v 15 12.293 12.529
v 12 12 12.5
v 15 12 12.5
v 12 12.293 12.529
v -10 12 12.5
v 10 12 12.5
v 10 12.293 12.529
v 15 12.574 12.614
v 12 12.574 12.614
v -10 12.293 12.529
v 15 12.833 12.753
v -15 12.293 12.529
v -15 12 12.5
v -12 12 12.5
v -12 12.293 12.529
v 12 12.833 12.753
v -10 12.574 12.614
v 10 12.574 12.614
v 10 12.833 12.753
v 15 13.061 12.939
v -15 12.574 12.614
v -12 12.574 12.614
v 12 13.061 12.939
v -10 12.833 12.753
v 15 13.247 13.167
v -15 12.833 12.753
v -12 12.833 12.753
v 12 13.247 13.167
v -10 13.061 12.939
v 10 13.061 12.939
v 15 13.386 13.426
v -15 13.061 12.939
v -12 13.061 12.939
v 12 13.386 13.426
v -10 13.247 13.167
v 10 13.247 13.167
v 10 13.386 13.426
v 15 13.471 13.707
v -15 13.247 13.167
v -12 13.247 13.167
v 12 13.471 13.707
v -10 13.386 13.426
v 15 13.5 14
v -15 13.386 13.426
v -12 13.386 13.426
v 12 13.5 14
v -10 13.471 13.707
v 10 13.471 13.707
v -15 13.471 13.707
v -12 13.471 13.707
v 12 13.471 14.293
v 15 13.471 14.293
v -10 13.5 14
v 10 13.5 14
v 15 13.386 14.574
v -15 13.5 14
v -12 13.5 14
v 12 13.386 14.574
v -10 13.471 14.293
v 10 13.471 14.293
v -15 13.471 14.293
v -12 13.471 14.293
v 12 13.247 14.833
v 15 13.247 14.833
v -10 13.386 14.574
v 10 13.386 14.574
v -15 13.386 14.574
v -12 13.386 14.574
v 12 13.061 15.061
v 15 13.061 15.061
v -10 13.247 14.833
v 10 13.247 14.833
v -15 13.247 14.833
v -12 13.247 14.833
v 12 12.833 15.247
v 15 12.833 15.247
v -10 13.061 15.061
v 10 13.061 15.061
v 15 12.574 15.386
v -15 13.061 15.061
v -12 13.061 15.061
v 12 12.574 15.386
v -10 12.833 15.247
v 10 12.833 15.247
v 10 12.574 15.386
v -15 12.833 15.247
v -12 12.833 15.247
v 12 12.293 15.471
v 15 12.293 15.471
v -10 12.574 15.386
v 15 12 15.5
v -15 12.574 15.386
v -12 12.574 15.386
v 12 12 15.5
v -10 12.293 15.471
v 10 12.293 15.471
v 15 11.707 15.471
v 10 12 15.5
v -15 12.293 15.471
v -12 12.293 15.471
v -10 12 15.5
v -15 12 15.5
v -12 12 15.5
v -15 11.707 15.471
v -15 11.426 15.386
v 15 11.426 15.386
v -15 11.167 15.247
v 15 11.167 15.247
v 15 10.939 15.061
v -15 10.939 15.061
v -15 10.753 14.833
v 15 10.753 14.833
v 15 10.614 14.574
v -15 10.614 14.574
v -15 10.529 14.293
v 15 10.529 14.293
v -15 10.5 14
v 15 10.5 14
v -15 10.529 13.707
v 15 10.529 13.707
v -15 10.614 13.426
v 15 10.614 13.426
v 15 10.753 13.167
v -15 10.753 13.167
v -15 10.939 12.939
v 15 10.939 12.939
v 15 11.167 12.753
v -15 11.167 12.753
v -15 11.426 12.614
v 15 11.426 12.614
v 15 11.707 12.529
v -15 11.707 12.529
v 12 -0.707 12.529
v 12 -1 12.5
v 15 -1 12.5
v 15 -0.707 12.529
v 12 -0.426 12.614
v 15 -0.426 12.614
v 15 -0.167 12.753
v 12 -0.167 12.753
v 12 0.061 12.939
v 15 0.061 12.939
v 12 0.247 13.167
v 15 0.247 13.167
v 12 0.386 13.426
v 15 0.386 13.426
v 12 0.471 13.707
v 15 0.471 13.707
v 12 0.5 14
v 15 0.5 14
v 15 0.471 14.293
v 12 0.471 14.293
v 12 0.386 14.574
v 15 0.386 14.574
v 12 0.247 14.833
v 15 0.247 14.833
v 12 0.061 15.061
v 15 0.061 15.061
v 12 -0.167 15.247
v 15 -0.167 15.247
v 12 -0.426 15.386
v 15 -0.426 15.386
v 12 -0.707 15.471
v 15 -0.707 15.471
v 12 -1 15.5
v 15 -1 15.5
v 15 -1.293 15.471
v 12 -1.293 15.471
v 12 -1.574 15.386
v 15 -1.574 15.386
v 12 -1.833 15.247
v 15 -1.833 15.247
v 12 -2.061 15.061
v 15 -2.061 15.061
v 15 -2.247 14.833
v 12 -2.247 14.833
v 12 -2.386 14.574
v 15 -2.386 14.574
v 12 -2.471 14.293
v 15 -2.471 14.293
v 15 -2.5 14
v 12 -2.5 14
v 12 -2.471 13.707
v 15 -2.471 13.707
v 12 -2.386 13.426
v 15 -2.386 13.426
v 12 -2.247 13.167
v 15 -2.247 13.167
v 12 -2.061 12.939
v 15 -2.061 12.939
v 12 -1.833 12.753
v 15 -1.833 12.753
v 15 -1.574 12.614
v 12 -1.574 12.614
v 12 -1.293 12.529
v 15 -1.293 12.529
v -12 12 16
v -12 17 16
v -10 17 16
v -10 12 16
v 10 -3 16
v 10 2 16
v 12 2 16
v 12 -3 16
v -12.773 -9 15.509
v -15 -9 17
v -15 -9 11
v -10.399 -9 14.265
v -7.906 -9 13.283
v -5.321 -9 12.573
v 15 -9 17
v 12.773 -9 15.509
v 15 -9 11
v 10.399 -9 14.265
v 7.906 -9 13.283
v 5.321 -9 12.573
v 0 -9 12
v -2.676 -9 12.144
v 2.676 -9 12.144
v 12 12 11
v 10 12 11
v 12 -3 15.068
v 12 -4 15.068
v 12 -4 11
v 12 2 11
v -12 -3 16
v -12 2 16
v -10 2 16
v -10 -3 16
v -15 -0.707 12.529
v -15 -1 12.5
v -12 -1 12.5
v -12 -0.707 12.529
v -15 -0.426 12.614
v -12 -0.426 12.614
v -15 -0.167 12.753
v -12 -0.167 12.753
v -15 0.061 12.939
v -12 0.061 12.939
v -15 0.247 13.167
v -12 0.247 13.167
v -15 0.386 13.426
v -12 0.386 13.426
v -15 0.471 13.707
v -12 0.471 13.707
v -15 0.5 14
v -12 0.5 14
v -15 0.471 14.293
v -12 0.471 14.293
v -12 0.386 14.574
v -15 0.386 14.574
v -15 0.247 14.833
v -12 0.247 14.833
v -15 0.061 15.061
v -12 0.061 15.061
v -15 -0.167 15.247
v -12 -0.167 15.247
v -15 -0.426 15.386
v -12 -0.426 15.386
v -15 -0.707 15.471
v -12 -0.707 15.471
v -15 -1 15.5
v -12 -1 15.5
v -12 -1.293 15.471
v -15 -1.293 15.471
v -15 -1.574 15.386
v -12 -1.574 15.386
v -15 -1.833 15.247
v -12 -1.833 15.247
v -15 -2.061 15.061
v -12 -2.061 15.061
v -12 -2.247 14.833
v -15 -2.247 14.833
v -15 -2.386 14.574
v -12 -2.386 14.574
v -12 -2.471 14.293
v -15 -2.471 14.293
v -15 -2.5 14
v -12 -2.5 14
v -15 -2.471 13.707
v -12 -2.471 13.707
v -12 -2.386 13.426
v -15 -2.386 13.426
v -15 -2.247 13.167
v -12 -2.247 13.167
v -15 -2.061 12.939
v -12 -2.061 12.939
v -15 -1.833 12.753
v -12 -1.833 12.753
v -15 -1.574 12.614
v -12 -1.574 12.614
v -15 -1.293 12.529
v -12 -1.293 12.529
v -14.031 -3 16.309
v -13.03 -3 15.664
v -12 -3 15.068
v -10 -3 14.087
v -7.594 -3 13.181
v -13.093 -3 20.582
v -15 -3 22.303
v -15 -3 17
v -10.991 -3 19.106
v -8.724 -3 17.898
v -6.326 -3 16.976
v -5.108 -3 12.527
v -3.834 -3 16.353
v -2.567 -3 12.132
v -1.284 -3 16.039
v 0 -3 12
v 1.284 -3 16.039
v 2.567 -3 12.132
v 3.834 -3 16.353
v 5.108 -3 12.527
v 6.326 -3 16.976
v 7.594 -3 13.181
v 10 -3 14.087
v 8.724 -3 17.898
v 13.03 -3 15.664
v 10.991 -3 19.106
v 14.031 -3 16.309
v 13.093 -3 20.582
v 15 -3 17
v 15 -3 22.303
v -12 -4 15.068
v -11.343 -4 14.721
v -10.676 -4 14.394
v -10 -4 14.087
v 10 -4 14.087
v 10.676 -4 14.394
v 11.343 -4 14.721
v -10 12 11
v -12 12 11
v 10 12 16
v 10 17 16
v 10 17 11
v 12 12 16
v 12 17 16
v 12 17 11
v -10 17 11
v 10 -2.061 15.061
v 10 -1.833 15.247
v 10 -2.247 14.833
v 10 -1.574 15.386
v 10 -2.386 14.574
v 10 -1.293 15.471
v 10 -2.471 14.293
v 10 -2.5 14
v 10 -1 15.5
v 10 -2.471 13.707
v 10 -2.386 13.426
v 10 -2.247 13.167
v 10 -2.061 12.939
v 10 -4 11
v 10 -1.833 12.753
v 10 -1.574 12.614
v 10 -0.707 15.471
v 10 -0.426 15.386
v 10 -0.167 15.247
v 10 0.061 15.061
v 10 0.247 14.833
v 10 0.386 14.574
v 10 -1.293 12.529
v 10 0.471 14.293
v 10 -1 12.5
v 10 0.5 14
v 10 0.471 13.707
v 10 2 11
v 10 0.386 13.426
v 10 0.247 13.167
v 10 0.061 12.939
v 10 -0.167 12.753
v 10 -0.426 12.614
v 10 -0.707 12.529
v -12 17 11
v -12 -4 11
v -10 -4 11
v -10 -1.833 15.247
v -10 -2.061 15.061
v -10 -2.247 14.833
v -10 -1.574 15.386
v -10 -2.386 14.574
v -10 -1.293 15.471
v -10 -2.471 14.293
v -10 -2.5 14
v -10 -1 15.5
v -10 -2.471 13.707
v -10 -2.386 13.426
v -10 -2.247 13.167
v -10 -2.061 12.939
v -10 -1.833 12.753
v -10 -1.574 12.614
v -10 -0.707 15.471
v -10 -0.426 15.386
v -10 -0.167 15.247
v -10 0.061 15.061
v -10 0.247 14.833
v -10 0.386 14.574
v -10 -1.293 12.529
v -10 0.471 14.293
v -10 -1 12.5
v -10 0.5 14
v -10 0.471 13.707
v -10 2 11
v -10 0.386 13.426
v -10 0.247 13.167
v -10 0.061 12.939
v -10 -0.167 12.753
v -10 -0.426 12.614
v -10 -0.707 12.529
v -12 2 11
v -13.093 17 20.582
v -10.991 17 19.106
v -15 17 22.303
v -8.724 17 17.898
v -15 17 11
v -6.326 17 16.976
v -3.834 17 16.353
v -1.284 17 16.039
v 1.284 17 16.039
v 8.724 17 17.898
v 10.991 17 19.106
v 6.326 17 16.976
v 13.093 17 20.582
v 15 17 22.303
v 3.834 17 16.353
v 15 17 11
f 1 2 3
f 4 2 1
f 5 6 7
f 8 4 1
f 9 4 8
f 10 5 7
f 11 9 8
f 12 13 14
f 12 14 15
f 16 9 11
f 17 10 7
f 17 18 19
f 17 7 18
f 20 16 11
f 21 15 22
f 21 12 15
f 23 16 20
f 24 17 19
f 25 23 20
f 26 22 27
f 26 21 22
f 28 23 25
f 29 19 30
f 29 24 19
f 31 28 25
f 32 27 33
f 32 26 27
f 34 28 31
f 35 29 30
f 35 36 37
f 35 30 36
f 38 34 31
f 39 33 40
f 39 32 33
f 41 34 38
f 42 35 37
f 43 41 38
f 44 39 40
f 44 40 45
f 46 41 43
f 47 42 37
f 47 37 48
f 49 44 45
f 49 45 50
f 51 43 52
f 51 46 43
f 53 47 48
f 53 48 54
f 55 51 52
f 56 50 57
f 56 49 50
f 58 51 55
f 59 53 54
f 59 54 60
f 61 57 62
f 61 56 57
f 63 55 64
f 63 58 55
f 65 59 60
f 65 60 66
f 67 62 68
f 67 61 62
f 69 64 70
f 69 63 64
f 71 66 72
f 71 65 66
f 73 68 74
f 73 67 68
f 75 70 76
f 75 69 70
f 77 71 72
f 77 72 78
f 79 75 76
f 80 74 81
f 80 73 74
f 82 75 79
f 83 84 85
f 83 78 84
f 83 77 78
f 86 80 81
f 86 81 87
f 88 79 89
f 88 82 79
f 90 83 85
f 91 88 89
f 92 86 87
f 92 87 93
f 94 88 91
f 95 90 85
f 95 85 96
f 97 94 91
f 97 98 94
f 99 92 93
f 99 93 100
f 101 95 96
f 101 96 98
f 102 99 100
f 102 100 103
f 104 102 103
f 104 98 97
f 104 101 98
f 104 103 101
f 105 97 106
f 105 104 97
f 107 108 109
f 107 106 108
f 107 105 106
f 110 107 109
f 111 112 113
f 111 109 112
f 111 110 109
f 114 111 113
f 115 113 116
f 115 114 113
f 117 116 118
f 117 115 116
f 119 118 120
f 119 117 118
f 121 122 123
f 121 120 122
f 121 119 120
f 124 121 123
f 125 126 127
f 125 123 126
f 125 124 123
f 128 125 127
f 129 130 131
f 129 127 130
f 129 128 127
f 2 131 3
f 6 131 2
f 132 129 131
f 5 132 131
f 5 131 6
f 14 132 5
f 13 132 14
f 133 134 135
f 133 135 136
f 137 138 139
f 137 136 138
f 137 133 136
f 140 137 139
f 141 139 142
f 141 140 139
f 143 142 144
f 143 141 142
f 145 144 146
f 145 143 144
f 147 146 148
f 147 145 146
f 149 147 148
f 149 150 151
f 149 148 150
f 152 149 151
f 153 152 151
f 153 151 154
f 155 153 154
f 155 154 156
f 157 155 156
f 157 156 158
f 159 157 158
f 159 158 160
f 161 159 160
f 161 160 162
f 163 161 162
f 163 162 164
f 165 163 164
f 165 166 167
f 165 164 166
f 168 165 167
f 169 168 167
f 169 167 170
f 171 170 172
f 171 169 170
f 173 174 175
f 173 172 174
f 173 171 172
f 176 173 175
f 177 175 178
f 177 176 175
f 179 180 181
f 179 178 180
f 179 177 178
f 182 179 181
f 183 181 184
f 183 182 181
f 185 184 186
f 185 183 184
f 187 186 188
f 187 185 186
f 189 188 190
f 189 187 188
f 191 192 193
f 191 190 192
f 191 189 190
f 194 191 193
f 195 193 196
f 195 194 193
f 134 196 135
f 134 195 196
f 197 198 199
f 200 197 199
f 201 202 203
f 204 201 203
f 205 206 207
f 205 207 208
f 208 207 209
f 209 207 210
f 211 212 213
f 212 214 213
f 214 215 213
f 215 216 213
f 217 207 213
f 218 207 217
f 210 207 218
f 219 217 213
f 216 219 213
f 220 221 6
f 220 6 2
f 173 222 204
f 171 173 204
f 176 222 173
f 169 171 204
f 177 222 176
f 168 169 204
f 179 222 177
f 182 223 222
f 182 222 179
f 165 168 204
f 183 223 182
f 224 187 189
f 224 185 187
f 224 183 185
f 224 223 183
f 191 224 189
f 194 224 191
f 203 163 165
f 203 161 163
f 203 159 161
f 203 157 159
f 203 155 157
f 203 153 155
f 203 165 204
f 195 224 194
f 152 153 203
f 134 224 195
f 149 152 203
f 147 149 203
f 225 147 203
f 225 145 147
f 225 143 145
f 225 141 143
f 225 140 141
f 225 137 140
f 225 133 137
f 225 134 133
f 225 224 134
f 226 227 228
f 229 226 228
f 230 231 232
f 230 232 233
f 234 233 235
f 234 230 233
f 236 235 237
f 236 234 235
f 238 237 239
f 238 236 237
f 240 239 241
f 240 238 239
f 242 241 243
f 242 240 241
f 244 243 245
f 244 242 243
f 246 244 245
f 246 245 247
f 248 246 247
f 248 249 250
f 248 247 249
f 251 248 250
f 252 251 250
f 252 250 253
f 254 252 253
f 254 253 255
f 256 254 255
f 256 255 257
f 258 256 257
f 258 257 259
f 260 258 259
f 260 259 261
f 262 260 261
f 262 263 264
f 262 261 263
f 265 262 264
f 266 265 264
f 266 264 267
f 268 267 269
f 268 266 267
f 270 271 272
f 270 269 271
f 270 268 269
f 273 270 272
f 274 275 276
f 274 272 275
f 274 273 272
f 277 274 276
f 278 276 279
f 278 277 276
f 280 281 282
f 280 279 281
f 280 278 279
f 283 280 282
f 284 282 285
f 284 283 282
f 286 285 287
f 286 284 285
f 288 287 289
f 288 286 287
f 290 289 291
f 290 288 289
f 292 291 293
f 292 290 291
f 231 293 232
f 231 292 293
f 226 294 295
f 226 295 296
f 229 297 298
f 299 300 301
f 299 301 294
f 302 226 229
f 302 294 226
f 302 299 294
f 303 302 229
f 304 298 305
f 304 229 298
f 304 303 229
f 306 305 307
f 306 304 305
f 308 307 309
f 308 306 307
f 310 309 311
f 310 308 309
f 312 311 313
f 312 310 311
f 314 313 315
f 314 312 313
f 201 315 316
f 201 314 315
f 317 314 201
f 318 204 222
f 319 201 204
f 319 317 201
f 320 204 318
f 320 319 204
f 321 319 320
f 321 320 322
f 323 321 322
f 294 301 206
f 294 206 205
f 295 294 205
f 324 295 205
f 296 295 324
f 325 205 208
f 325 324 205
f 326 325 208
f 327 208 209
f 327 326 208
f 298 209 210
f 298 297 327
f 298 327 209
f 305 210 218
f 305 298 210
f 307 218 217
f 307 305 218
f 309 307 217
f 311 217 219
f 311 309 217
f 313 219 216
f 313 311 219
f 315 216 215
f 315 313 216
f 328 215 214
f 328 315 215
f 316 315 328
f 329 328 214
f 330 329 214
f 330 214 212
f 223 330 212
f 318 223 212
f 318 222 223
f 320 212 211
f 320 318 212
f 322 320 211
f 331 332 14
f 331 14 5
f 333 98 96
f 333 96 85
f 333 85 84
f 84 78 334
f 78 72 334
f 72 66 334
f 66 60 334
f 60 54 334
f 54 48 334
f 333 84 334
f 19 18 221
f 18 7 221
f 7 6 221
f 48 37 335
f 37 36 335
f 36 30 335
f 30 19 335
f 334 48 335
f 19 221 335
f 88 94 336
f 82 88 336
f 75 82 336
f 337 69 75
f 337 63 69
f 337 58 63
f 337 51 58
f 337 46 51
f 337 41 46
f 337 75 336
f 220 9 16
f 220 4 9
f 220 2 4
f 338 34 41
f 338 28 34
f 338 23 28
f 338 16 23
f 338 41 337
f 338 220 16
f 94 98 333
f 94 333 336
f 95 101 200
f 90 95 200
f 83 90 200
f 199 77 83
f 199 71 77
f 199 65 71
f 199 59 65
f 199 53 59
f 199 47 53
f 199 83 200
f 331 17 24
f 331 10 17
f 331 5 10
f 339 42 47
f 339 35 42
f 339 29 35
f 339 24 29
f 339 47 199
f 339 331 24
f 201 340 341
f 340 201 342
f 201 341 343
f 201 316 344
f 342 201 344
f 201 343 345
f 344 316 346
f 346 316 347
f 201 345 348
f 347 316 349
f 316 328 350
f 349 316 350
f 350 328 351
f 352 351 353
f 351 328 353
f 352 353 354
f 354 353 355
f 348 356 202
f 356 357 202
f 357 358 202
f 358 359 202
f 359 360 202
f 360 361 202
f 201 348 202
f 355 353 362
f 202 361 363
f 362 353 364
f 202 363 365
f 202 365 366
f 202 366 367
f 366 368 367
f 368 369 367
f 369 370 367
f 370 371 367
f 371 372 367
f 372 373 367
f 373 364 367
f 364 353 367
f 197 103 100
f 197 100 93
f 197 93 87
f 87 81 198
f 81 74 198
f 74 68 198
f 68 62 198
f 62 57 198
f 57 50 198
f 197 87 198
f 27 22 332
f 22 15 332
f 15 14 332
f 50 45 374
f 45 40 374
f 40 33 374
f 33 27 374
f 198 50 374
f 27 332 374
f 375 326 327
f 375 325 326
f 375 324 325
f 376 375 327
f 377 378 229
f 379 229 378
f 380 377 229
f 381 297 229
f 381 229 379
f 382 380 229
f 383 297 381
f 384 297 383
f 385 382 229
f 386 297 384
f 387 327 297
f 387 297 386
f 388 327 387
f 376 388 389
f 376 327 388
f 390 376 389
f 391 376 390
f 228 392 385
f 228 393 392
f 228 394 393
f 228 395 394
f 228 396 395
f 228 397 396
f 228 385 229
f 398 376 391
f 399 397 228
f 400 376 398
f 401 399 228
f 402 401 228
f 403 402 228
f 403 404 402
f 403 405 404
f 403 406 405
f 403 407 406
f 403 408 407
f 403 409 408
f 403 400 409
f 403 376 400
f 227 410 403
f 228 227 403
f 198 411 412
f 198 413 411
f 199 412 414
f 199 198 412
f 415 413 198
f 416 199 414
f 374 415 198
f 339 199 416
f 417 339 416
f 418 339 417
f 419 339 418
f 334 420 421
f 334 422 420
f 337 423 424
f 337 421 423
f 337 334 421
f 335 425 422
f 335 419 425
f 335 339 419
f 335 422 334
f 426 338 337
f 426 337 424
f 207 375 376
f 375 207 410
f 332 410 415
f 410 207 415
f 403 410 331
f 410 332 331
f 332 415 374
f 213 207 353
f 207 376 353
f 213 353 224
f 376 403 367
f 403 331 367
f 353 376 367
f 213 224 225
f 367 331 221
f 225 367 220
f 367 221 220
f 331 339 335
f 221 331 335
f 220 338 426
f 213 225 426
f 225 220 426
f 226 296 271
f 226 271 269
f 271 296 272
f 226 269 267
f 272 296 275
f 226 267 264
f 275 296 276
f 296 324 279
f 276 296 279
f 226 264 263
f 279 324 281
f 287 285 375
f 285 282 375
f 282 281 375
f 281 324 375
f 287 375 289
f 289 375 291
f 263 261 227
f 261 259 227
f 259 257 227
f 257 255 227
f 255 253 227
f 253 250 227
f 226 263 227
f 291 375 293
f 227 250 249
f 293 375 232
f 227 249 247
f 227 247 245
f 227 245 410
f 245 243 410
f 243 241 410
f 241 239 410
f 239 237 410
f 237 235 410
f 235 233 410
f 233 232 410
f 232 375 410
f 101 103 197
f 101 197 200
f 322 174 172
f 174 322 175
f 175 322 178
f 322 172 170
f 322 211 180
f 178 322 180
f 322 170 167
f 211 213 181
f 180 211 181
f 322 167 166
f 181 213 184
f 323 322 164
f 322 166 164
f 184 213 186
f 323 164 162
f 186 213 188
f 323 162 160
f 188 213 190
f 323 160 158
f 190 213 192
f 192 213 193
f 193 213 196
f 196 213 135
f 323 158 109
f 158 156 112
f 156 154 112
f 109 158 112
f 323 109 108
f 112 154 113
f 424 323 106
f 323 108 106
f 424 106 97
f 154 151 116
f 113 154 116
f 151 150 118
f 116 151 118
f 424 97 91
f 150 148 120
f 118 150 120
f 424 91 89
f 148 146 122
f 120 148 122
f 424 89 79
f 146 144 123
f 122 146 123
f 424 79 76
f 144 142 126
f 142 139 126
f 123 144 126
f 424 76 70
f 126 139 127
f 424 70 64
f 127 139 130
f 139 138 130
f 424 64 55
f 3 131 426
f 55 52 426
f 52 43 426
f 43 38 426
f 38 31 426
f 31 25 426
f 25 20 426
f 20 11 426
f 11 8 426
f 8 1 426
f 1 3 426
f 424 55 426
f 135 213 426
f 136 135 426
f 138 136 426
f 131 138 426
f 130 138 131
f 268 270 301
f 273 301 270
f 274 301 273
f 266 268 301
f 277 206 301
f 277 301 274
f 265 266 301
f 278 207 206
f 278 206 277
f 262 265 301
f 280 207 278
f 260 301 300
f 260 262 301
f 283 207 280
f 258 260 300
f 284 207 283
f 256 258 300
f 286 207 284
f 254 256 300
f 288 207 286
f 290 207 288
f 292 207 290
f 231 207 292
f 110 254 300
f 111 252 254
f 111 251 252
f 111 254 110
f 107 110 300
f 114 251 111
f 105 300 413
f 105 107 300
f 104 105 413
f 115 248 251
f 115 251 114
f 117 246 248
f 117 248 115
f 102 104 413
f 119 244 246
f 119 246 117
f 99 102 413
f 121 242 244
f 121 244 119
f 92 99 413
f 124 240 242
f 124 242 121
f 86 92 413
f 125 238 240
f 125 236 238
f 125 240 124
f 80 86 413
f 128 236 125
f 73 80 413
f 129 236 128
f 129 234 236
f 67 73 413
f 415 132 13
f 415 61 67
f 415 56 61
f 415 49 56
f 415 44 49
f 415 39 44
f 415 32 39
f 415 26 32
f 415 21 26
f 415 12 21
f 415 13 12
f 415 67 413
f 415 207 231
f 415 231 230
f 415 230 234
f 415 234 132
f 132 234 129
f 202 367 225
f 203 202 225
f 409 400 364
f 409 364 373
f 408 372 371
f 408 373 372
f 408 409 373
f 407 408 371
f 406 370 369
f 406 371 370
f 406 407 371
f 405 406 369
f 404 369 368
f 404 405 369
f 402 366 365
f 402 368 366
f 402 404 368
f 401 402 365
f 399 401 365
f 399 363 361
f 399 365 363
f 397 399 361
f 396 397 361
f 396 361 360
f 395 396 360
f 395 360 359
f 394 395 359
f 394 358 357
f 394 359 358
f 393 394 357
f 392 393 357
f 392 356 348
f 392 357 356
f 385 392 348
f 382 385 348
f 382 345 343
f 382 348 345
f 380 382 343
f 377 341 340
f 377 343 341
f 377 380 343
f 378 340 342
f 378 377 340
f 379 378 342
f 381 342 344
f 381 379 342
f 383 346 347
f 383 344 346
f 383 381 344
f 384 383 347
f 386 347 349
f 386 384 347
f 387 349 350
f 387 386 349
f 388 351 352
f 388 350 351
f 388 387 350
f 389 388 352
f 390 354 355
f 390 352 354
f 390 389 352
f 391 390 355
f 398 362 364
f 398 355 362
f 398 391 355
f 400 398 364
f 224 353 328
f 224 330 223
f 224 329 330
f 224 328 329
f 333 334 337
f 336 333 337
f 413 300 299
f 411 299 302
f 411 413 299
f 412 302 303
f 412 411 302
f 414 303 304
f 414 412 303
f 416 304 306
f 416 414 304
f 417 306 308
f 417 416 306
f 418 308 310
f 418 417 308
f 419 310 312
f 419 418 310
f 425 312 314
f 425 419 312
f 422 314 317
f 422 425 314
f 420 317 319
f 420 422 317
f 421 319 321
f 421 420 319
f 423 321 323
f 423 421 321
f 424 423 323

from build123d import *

# Parameters (mm, degrees)
CYLINDER2795_R     = 1.5
CYLINDER2795_DEPTH = 64
CYLINDER2794_R     = 1.5
CYLINDER2794_DEPTH = 64
CYLINDER2793_R     = 38
CYLINDER2793_DEPTH = 30
BOX983_W           = 2
BOX983_H           = 6
BOX983_DEPTH       = 6
BOX984_W           = 2
BOX984_H           = 6
BOX984_DEPTH       = 6
BOX985_W           = 2
BOX985_H           = 6
BOX985_DEPTH       = 6
BOX986_W           = 2
BOX986_H           = 6
BOX986_DEPTH       = 6
BOX987_W           = 2
BOX987_H           = 6
BOX987_DEPTH       = 6
BOX989_W           = 2
BOX989_H           = 6
BOX989_DEPTH       = 6
TUBE139_R          = 21
TUBE139_R_2        = 2
TUBE139_DEPTH      = 64
TUBE140_R          = 25
TUBE140_R_2        = 2
TUBE140_DEPTH      = 26
BOX988_W           = 30
BOX988_H           = 64
BOX988_DEPTH       = 18
BOX982_W           = 30
BOX982_H           = 26
BOX982_DEPTH       = 18


with BuildPart() as v_lec2765:
    # Cylinder2795 → Cylinder2795 (new body)
    with BuildSketch(Plane(origin=(-26, 12, 14), x_dir=(0, 0, -1), z_dir=(1, 0, 0))):
        Circle(CYLINDER2795_R)
    extrude(amount=CYLINDER2795_DEPTH)


with BuildPart() as compound1245:
    # Cylinder2794 → Cylinder2794 (new body)
    with BuildSketch(Plane(origin=(-26, -1, 14), x_dir=(0, 0, -1), z_dir=(1, 0, 0))):
        Circle(CYLINDER2794_R)
    extrude(amount=CYLINDER2794_DEPTH)

    # Compound1245: union Válec2765
    add(v_lec2765.part)


with BuildPart() as v_lec2763:
    # Cylinder2793 → Cylinder2793 (new body)
    with BuildSketch(Plane.XY):
        Circle(CYLINDER2793_R)
    extrude(amount=CYLINDER2793_DEPTH)


with BuildPart() as krychle982:
    # Box983 → Box983 (new body)
    with BuildSketch(Plane(origin=(-12, -4, 10), x_dir=(1, 0, 0), z_dir=(0, 0, 1))):
        with Locations((1, 3)):
            Rectangle(BOX983_W, BOX983_H)
    extrude(amount=BOX983_DEPTH)


with BuildPart() as krychle983:
    # Box984 → Box984 (new body)
    with BuildSketch(Plane(origin=(10, 26, 10), x_dir=(1, 0, 0), z_dir=(0, 0, 1))):
        with Locations((1, 3)):
            Rectangle(BOX984_W, BOX984_H)
    extrude(amount=BOX984_DEPTH)


with BuildPart() as krychle984:
    # Box985 → Box985 (new body)
    with BuildSketch(Plane(origin=(-12, 26, 10), x_dir=(1, 0, 0), z_dir=(0, 0, 1))):
        with Locations((1, 3)):
            Rectangle(BOX985_W, BOX985_H)
    extrude(amount=BOX985_DEPTH)


with BuildPart() as krychle985:
    # Box986 → Box986 (new body)
    with BuildSketch(Plane(origin=(10, 12, 10), x_dir=(1, 0, 0), z_dir=(0, 0, 1))):
        with Locations((1, 3)):
            Rectangle(BOX986_W, BOX986_H)
    extrude(amount=BOX986_DEPTH)


with BuildPart() as krychle986:
    # Box987 → Box987 (new body)
    with BuildSketch(Plane(origin=(-12, 12, 10), x_dir=(1, 0, 0), z_dir=(0, 0, 1))):
        with Locations((1, 3)):
            Rectangle(BOX987_W, BOX987_H)
    extrude(amount=BOX987_DEPTH)


with BuildPart() as compound1244:
    # Box989 → Box989 (new body)
    with BuildSketch(Plane(origin=(10, -4, 10), x_dir=(1, 0, 0), z_dir=(0, 0, 1))):
        with Locations((1, 3)):
            Rectangle(BOX989_W, BOX989_H)
    extrude(amount=BOX989_DEPTH)

    # Compound1244: union Krychle982, Krychle983, Krychle984, Krychle985, Krychle986
    add(krychle982.part)
    add(krychle983.part)
    add(krychle984.part)
    add(krychle985.part)
    add(krychle986.part)


with BuildPart() as tube139:
    # Tube139 → Tube139 (new body)
    with BuildSketch(Plane(origin=(0, 61, 37), x_dir=(1, 0, 0), z_dir=(0, -1, 0))):
        Circle(TUBE139_R)
        Circle(TUBE139_R_2, mode=Mode.SUBTRACT)
    extrude(amount=TUBE139_DEPTH)


with BuildPart() as tube140:
    # Tube140 → Tube140 (new body)
    with BuildSketch(Plane(origin=(0, -3, 37), x_dir=(1, 0, 0), z_dir=(0, -1, 0))):
        Circle(TUBE140_R)
        Circle(TUBE140_R_2, mode=Mode.SUBTRACT)
    extrude(amount=TUBE140_DEPTH)


with BuildPart() as common009:
    # Box988 → Box988 (new body)
    with BuildSketch(Plane(origin=(-15, -17, 11), x_dir=(1, 0, 0), z_dir=(0, 0, 1))):
        with Locations((15, 32)):
            Rectangle(BOX988_W, BOX988_H)
    extrude(amount=BOX988_DEPTH)

    # Cut1053: cut Tube140
    add(tube140.part, mode=Mode.SUBTRACT)

    # Cut1054: cut Tube139
    add(tube139.part, mode=Mode.SUBTRACT)

    # Cut1055: cut Compound1244
    add(compound1244.part, mode=Mode.SUBTRACT)

    # Common009: intersect Válec2763
    add(v_lec2763.part, mode=Mode.INTERSECT)


with BuildPart() as cut1056:
    # Box982 → Box982 (new body)
    with BuildSketch(Plane(origin=(-15, -9, 11), x_dir=(1, 0, 0), z_dir=(0, 0, 1))):
        with Locations((15, 13)):
            Rectangle(BOX982_W, BOX982_H)
    extrude(amount=BOX982_DEPTH)

    # Common010: intersect Common009
    add(common009.part, mode=Mode.INTERSECT)

    # Cut1056: cut Compound1245
    add(compound1245.part, mode=Mode.SUBTRACT)


solid = cut1056.part
